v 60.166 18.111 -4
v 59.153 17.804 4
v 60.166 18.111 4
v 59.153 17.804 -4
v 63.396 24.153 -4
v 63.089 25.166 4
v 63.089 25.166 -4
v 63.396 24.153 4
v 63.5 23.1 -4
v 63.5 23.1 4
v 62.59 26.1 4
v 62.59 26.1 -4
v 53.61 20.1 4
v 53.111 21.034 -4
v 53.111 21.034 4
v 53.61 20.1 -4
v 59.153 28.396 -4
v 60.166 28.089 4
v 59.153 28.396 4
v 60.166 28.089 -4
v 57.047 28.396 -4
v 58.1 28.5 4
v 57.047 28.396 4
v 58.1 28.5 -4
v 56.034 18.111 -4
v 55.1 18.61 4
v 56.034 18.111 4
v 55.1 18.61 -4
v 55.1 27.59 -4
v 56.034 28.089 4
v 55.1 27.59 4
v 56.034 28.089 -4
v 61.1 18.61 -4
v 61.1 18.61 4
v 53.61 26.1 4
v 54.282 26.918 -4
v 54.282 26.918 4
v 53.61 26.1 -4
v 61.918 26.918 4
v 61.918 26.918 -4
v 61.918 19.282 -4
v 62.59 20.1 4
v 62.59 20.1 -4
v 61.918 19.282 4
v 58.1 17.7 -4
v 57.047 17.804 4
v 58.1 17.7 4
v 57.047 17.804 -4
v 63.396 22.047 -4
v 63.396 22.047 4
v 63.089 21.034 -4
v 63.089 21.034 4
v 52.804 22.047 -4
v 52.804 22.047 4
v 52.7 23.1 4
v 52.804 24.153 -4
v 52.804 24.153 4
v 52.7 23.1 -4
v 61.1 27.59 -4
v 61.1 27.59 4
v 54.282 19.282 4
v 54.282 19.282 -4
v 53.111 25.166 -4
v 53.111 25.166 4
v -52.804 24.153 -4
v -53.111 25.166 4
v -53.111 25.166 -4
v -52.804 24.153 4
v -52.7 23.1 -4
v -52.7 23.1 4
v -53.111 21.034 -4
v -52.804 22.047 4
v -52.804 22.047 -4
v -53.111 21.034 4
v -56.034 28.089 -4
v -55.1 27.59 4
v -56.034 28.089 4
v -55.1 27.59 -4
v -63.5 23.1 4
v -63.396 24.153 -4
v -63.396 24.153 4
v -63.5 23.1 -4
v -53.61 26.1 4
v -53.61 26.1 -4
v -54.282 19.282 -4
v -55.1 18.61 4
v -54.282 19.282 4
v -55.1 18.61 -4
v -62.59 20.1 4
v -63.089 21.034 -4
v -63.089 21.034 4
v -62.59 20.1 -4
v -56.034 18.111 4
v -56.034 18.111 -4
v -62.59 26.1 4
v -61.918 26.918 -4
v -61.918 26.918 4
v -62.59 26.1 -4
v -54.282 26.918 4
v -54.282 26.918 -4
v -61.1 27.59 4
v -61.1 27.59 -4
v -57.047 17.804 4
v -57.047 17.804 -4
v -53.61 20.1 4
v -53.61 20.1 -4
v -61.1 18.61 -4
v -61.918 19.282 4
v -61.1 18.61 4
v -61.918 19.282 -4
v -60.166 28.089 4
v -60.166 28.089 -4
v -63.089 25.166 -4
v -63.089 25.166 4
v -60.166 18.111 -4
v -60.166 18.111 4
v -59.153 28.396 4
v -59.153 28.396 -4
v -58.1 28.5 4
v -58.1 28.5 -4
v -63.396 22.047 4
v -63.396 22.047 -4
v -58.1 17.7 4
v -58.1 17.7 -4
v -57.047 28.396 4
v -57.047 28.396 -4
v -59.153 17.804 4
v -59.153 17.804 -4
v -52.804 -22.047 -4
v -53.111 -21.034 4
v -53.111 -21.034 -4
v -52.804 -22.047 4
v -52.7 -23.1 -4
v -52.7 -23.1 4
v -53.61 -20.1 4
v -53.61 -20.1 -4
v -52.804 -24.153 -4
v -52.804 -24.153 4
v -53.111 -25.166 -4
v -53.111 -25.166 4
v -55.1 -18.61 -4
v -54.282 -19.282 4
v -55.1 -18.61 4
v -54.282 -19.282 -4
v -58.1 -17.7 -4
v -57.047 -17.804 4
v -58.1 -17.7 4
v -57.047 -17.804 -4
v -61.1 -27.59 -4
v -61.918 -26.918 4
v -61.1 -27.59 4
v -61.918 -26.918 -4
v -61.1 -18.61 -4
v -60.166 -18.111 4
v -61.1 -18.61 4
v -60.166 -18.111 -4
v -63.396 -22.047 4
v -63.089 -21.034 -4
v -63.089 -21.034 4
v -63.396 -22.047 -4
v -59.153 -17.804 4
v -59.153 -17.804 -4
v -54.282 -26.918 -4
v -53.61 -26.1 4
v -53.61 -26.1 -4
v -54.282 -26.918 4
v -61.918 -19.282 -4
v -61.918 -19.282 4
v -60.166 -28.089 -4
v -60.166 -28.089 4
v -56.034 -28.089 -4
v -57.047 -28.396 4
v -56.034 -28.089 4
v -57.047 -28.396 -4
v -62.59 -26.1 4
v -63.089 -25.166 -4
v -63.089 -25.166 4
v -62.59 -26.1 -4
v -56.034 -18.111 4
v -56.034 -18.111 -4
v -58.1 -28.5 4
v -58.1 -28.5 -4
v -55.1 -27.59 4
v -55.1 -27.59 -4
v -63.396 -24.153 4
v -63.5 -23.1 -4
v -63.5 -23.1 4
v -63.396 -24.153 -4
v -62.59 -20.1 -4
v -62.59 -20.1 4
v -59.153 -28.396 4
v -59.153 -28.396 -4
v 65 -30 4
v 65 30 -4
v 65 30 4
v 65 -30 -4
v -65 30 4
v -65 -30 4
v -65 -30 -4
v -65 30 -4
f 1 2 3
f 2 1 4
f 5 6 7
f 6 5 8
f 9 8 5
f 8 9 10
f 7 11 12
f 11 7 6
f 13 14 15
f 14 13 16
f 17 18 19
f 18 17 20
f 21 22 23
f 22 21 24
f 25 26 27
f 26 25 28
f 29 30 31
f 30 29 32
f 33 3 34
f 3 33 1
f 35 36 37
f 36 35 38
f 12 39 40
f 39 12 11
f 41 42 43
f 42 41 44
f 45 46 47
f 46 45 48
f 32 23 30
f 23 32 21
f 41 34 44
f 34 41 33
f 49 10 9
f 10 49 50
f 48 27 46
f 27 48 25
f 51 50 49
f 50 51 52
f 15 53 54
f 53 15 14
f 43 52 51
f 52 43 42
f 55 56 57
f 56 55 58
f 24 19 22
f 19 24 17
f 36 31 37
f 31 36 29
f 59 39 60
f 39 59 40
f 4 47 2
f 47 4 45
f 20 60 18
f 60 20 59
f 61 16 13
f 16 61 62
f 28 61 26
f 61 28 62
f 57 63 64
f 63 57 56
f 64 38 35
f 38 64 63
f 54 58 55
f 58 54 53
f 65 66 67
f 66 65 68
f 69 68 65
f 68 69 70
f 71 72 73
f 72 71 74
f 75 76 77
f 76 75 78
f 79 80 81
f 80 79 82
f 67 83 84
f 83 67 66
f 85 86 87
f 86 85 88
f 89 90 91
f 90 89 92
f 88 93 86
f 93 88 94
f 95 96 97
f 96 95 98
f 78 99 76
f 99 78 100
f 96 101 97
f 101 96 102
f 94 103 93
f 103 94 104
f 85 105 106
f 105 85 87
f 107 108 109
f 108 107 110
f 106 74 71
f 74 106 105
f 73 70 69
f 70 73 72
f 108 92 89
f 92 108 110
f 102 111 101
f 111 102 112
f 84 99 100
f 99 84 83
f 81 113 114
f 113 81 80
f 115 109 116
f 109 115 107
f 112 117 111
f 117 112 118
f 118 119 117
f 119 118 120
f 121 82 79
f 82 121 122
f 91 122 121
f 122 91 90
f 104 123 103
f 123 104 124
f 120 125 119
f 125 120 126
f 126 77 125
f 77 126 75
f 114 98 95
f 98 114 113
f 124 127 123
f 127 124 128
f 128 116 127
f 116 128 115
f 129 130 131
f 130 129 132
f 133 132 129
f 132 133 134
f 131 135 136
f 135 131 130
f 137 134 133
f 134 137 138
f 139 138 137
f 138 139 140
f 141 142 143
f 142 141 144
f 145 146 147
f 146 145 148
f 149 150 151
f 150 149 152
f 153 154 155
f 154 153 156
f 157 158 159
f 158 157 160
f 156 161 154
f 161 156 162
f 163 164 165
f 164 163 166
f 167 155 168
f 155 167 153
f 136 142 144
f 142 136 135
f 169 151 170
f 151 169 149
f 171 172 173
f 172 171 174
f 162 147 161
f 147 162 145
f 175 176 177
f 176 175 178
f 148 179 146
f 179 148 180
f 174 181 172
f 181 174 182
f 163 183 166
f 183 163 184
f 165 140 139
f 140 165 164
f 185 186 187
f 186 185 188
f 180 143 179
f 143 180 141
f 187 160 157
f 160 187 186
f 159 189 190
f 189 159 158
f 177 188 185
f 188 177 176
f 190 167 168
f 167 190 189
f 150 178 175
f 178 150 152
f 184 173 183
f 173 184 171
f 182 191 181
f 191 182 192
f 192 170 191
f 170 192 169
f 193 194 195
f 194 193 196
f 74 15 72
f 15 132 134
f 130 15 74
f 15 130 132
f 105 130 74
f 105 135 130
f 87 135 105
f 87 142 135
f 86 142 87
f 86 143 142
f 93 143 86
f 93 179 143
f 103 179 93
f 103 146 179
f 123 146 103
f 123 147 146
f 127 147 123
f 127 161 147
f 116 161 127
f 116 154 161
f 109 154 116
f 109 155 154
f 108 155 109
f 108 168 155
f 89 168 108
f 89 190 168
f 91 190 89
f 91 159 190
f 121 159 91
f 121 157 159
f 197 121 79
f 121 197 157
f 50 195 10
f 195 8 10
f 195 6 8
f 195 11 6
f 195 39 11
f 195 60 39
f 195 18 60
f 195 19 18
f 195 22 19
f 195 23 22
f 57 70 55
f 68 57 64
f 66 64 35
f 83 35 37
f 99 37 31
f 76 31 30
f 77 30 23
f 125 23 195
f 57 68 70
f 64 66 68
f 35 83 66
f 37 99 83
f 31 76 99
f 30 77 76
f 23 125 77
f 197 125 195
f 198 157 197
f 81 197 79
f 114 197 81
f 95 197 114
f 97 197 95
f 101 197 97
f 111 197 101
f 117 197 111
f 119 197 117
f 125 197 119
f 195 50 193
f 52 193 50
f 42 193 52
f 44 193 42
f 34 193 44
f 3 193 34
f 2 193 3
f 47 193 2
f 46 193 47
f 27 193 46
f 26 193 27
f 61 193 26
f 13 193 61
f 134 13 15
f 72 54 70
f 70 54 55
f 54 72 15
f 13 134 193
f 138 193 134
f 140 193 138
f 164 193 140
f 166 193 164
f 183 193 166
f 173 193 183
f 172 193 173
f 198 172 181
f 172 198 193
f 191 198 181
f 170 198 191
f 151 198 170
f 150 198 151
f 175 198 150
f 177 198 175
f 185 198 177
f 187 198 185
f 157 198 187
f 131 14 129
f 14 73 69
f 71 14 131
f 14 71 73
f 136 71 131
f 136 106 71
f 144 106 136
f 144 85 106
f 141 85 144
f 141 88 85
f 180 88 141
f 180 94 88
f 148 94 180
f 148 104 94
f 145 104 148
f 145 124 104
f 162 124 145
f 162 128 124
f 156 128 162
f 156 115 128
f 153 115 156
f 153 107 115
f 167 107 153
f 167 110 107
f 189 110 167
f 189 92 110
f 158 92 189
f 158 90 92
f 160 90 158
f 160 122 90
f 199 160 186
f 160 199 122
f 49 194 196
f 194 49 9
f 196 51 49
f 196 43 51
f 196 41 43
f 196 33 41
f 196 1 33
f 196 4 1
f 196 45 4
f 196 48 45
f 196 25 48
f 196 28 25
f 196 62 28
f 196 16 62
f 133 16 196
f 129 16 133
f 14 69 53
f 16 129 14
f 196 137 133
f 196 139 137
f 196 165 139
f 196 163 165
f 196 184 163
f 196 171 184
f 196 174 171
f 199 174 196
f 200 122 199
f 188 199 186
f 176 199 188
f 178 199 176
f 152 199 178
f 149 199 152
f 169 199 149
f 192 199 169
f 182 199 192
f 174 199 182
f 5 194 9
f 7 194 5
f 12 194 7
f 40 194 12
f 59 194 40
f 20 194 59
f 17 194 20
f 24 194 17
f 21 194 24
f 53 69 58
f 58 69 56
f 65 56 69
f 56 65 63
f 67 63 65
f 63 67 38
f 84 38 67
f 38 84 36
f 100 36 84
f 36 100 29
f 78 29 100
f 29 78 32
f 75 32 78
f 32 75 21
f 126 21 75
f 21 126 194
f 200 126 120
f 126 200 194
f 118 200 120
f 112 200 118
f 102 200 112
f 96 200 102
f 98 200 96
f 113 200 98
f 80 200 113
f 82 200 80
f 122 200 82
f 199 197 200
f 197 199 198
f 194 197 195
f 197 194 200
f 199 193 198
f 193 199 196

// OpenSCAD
$fn = 32;

// ----------------------------------------------------------------------
// Corner plate 130 x 60 x 8
// 3 holes, centres taken from the edge offset
// ----------------------------------------------------------------------

// --- parameters (mm) ---
plate = [130, 60, 8];   // overall size (x, y, z)
holes = 3;              // number of holes the drawing asks for
bore_d = 10.5;          // nominal hole diameter from the drawing
print_allowance = 0.3;  // clearance added for printing
edge = 6.9;             // hole centre offset from the plate edge

// --- derived feature positions (mm) ---
hole_d = bore_d + print_allowance;  // = 10.8   hole diameter as printed
corner_x = plate[0] / 2 - edge;     // = 58.1   corner hole X
corner_y = plate[1] / 2 - edge;     // = 23.1   corner hole Y
feature_centers = [
  [corner_x, corner_y],
  [-corner_x, corner_y],
  [-corner_x, -corner_y]
];   // hole centres the loop below drills

// plate outline, every hole drilled through with the same cutters
difference() {
  cube(plate, center = true);
  for (centre = feature_centers)
    translate([centre[0], centre[1], 0])
      cylinder(d = hole_d, h = plate[2] + 2, center = true);
}
